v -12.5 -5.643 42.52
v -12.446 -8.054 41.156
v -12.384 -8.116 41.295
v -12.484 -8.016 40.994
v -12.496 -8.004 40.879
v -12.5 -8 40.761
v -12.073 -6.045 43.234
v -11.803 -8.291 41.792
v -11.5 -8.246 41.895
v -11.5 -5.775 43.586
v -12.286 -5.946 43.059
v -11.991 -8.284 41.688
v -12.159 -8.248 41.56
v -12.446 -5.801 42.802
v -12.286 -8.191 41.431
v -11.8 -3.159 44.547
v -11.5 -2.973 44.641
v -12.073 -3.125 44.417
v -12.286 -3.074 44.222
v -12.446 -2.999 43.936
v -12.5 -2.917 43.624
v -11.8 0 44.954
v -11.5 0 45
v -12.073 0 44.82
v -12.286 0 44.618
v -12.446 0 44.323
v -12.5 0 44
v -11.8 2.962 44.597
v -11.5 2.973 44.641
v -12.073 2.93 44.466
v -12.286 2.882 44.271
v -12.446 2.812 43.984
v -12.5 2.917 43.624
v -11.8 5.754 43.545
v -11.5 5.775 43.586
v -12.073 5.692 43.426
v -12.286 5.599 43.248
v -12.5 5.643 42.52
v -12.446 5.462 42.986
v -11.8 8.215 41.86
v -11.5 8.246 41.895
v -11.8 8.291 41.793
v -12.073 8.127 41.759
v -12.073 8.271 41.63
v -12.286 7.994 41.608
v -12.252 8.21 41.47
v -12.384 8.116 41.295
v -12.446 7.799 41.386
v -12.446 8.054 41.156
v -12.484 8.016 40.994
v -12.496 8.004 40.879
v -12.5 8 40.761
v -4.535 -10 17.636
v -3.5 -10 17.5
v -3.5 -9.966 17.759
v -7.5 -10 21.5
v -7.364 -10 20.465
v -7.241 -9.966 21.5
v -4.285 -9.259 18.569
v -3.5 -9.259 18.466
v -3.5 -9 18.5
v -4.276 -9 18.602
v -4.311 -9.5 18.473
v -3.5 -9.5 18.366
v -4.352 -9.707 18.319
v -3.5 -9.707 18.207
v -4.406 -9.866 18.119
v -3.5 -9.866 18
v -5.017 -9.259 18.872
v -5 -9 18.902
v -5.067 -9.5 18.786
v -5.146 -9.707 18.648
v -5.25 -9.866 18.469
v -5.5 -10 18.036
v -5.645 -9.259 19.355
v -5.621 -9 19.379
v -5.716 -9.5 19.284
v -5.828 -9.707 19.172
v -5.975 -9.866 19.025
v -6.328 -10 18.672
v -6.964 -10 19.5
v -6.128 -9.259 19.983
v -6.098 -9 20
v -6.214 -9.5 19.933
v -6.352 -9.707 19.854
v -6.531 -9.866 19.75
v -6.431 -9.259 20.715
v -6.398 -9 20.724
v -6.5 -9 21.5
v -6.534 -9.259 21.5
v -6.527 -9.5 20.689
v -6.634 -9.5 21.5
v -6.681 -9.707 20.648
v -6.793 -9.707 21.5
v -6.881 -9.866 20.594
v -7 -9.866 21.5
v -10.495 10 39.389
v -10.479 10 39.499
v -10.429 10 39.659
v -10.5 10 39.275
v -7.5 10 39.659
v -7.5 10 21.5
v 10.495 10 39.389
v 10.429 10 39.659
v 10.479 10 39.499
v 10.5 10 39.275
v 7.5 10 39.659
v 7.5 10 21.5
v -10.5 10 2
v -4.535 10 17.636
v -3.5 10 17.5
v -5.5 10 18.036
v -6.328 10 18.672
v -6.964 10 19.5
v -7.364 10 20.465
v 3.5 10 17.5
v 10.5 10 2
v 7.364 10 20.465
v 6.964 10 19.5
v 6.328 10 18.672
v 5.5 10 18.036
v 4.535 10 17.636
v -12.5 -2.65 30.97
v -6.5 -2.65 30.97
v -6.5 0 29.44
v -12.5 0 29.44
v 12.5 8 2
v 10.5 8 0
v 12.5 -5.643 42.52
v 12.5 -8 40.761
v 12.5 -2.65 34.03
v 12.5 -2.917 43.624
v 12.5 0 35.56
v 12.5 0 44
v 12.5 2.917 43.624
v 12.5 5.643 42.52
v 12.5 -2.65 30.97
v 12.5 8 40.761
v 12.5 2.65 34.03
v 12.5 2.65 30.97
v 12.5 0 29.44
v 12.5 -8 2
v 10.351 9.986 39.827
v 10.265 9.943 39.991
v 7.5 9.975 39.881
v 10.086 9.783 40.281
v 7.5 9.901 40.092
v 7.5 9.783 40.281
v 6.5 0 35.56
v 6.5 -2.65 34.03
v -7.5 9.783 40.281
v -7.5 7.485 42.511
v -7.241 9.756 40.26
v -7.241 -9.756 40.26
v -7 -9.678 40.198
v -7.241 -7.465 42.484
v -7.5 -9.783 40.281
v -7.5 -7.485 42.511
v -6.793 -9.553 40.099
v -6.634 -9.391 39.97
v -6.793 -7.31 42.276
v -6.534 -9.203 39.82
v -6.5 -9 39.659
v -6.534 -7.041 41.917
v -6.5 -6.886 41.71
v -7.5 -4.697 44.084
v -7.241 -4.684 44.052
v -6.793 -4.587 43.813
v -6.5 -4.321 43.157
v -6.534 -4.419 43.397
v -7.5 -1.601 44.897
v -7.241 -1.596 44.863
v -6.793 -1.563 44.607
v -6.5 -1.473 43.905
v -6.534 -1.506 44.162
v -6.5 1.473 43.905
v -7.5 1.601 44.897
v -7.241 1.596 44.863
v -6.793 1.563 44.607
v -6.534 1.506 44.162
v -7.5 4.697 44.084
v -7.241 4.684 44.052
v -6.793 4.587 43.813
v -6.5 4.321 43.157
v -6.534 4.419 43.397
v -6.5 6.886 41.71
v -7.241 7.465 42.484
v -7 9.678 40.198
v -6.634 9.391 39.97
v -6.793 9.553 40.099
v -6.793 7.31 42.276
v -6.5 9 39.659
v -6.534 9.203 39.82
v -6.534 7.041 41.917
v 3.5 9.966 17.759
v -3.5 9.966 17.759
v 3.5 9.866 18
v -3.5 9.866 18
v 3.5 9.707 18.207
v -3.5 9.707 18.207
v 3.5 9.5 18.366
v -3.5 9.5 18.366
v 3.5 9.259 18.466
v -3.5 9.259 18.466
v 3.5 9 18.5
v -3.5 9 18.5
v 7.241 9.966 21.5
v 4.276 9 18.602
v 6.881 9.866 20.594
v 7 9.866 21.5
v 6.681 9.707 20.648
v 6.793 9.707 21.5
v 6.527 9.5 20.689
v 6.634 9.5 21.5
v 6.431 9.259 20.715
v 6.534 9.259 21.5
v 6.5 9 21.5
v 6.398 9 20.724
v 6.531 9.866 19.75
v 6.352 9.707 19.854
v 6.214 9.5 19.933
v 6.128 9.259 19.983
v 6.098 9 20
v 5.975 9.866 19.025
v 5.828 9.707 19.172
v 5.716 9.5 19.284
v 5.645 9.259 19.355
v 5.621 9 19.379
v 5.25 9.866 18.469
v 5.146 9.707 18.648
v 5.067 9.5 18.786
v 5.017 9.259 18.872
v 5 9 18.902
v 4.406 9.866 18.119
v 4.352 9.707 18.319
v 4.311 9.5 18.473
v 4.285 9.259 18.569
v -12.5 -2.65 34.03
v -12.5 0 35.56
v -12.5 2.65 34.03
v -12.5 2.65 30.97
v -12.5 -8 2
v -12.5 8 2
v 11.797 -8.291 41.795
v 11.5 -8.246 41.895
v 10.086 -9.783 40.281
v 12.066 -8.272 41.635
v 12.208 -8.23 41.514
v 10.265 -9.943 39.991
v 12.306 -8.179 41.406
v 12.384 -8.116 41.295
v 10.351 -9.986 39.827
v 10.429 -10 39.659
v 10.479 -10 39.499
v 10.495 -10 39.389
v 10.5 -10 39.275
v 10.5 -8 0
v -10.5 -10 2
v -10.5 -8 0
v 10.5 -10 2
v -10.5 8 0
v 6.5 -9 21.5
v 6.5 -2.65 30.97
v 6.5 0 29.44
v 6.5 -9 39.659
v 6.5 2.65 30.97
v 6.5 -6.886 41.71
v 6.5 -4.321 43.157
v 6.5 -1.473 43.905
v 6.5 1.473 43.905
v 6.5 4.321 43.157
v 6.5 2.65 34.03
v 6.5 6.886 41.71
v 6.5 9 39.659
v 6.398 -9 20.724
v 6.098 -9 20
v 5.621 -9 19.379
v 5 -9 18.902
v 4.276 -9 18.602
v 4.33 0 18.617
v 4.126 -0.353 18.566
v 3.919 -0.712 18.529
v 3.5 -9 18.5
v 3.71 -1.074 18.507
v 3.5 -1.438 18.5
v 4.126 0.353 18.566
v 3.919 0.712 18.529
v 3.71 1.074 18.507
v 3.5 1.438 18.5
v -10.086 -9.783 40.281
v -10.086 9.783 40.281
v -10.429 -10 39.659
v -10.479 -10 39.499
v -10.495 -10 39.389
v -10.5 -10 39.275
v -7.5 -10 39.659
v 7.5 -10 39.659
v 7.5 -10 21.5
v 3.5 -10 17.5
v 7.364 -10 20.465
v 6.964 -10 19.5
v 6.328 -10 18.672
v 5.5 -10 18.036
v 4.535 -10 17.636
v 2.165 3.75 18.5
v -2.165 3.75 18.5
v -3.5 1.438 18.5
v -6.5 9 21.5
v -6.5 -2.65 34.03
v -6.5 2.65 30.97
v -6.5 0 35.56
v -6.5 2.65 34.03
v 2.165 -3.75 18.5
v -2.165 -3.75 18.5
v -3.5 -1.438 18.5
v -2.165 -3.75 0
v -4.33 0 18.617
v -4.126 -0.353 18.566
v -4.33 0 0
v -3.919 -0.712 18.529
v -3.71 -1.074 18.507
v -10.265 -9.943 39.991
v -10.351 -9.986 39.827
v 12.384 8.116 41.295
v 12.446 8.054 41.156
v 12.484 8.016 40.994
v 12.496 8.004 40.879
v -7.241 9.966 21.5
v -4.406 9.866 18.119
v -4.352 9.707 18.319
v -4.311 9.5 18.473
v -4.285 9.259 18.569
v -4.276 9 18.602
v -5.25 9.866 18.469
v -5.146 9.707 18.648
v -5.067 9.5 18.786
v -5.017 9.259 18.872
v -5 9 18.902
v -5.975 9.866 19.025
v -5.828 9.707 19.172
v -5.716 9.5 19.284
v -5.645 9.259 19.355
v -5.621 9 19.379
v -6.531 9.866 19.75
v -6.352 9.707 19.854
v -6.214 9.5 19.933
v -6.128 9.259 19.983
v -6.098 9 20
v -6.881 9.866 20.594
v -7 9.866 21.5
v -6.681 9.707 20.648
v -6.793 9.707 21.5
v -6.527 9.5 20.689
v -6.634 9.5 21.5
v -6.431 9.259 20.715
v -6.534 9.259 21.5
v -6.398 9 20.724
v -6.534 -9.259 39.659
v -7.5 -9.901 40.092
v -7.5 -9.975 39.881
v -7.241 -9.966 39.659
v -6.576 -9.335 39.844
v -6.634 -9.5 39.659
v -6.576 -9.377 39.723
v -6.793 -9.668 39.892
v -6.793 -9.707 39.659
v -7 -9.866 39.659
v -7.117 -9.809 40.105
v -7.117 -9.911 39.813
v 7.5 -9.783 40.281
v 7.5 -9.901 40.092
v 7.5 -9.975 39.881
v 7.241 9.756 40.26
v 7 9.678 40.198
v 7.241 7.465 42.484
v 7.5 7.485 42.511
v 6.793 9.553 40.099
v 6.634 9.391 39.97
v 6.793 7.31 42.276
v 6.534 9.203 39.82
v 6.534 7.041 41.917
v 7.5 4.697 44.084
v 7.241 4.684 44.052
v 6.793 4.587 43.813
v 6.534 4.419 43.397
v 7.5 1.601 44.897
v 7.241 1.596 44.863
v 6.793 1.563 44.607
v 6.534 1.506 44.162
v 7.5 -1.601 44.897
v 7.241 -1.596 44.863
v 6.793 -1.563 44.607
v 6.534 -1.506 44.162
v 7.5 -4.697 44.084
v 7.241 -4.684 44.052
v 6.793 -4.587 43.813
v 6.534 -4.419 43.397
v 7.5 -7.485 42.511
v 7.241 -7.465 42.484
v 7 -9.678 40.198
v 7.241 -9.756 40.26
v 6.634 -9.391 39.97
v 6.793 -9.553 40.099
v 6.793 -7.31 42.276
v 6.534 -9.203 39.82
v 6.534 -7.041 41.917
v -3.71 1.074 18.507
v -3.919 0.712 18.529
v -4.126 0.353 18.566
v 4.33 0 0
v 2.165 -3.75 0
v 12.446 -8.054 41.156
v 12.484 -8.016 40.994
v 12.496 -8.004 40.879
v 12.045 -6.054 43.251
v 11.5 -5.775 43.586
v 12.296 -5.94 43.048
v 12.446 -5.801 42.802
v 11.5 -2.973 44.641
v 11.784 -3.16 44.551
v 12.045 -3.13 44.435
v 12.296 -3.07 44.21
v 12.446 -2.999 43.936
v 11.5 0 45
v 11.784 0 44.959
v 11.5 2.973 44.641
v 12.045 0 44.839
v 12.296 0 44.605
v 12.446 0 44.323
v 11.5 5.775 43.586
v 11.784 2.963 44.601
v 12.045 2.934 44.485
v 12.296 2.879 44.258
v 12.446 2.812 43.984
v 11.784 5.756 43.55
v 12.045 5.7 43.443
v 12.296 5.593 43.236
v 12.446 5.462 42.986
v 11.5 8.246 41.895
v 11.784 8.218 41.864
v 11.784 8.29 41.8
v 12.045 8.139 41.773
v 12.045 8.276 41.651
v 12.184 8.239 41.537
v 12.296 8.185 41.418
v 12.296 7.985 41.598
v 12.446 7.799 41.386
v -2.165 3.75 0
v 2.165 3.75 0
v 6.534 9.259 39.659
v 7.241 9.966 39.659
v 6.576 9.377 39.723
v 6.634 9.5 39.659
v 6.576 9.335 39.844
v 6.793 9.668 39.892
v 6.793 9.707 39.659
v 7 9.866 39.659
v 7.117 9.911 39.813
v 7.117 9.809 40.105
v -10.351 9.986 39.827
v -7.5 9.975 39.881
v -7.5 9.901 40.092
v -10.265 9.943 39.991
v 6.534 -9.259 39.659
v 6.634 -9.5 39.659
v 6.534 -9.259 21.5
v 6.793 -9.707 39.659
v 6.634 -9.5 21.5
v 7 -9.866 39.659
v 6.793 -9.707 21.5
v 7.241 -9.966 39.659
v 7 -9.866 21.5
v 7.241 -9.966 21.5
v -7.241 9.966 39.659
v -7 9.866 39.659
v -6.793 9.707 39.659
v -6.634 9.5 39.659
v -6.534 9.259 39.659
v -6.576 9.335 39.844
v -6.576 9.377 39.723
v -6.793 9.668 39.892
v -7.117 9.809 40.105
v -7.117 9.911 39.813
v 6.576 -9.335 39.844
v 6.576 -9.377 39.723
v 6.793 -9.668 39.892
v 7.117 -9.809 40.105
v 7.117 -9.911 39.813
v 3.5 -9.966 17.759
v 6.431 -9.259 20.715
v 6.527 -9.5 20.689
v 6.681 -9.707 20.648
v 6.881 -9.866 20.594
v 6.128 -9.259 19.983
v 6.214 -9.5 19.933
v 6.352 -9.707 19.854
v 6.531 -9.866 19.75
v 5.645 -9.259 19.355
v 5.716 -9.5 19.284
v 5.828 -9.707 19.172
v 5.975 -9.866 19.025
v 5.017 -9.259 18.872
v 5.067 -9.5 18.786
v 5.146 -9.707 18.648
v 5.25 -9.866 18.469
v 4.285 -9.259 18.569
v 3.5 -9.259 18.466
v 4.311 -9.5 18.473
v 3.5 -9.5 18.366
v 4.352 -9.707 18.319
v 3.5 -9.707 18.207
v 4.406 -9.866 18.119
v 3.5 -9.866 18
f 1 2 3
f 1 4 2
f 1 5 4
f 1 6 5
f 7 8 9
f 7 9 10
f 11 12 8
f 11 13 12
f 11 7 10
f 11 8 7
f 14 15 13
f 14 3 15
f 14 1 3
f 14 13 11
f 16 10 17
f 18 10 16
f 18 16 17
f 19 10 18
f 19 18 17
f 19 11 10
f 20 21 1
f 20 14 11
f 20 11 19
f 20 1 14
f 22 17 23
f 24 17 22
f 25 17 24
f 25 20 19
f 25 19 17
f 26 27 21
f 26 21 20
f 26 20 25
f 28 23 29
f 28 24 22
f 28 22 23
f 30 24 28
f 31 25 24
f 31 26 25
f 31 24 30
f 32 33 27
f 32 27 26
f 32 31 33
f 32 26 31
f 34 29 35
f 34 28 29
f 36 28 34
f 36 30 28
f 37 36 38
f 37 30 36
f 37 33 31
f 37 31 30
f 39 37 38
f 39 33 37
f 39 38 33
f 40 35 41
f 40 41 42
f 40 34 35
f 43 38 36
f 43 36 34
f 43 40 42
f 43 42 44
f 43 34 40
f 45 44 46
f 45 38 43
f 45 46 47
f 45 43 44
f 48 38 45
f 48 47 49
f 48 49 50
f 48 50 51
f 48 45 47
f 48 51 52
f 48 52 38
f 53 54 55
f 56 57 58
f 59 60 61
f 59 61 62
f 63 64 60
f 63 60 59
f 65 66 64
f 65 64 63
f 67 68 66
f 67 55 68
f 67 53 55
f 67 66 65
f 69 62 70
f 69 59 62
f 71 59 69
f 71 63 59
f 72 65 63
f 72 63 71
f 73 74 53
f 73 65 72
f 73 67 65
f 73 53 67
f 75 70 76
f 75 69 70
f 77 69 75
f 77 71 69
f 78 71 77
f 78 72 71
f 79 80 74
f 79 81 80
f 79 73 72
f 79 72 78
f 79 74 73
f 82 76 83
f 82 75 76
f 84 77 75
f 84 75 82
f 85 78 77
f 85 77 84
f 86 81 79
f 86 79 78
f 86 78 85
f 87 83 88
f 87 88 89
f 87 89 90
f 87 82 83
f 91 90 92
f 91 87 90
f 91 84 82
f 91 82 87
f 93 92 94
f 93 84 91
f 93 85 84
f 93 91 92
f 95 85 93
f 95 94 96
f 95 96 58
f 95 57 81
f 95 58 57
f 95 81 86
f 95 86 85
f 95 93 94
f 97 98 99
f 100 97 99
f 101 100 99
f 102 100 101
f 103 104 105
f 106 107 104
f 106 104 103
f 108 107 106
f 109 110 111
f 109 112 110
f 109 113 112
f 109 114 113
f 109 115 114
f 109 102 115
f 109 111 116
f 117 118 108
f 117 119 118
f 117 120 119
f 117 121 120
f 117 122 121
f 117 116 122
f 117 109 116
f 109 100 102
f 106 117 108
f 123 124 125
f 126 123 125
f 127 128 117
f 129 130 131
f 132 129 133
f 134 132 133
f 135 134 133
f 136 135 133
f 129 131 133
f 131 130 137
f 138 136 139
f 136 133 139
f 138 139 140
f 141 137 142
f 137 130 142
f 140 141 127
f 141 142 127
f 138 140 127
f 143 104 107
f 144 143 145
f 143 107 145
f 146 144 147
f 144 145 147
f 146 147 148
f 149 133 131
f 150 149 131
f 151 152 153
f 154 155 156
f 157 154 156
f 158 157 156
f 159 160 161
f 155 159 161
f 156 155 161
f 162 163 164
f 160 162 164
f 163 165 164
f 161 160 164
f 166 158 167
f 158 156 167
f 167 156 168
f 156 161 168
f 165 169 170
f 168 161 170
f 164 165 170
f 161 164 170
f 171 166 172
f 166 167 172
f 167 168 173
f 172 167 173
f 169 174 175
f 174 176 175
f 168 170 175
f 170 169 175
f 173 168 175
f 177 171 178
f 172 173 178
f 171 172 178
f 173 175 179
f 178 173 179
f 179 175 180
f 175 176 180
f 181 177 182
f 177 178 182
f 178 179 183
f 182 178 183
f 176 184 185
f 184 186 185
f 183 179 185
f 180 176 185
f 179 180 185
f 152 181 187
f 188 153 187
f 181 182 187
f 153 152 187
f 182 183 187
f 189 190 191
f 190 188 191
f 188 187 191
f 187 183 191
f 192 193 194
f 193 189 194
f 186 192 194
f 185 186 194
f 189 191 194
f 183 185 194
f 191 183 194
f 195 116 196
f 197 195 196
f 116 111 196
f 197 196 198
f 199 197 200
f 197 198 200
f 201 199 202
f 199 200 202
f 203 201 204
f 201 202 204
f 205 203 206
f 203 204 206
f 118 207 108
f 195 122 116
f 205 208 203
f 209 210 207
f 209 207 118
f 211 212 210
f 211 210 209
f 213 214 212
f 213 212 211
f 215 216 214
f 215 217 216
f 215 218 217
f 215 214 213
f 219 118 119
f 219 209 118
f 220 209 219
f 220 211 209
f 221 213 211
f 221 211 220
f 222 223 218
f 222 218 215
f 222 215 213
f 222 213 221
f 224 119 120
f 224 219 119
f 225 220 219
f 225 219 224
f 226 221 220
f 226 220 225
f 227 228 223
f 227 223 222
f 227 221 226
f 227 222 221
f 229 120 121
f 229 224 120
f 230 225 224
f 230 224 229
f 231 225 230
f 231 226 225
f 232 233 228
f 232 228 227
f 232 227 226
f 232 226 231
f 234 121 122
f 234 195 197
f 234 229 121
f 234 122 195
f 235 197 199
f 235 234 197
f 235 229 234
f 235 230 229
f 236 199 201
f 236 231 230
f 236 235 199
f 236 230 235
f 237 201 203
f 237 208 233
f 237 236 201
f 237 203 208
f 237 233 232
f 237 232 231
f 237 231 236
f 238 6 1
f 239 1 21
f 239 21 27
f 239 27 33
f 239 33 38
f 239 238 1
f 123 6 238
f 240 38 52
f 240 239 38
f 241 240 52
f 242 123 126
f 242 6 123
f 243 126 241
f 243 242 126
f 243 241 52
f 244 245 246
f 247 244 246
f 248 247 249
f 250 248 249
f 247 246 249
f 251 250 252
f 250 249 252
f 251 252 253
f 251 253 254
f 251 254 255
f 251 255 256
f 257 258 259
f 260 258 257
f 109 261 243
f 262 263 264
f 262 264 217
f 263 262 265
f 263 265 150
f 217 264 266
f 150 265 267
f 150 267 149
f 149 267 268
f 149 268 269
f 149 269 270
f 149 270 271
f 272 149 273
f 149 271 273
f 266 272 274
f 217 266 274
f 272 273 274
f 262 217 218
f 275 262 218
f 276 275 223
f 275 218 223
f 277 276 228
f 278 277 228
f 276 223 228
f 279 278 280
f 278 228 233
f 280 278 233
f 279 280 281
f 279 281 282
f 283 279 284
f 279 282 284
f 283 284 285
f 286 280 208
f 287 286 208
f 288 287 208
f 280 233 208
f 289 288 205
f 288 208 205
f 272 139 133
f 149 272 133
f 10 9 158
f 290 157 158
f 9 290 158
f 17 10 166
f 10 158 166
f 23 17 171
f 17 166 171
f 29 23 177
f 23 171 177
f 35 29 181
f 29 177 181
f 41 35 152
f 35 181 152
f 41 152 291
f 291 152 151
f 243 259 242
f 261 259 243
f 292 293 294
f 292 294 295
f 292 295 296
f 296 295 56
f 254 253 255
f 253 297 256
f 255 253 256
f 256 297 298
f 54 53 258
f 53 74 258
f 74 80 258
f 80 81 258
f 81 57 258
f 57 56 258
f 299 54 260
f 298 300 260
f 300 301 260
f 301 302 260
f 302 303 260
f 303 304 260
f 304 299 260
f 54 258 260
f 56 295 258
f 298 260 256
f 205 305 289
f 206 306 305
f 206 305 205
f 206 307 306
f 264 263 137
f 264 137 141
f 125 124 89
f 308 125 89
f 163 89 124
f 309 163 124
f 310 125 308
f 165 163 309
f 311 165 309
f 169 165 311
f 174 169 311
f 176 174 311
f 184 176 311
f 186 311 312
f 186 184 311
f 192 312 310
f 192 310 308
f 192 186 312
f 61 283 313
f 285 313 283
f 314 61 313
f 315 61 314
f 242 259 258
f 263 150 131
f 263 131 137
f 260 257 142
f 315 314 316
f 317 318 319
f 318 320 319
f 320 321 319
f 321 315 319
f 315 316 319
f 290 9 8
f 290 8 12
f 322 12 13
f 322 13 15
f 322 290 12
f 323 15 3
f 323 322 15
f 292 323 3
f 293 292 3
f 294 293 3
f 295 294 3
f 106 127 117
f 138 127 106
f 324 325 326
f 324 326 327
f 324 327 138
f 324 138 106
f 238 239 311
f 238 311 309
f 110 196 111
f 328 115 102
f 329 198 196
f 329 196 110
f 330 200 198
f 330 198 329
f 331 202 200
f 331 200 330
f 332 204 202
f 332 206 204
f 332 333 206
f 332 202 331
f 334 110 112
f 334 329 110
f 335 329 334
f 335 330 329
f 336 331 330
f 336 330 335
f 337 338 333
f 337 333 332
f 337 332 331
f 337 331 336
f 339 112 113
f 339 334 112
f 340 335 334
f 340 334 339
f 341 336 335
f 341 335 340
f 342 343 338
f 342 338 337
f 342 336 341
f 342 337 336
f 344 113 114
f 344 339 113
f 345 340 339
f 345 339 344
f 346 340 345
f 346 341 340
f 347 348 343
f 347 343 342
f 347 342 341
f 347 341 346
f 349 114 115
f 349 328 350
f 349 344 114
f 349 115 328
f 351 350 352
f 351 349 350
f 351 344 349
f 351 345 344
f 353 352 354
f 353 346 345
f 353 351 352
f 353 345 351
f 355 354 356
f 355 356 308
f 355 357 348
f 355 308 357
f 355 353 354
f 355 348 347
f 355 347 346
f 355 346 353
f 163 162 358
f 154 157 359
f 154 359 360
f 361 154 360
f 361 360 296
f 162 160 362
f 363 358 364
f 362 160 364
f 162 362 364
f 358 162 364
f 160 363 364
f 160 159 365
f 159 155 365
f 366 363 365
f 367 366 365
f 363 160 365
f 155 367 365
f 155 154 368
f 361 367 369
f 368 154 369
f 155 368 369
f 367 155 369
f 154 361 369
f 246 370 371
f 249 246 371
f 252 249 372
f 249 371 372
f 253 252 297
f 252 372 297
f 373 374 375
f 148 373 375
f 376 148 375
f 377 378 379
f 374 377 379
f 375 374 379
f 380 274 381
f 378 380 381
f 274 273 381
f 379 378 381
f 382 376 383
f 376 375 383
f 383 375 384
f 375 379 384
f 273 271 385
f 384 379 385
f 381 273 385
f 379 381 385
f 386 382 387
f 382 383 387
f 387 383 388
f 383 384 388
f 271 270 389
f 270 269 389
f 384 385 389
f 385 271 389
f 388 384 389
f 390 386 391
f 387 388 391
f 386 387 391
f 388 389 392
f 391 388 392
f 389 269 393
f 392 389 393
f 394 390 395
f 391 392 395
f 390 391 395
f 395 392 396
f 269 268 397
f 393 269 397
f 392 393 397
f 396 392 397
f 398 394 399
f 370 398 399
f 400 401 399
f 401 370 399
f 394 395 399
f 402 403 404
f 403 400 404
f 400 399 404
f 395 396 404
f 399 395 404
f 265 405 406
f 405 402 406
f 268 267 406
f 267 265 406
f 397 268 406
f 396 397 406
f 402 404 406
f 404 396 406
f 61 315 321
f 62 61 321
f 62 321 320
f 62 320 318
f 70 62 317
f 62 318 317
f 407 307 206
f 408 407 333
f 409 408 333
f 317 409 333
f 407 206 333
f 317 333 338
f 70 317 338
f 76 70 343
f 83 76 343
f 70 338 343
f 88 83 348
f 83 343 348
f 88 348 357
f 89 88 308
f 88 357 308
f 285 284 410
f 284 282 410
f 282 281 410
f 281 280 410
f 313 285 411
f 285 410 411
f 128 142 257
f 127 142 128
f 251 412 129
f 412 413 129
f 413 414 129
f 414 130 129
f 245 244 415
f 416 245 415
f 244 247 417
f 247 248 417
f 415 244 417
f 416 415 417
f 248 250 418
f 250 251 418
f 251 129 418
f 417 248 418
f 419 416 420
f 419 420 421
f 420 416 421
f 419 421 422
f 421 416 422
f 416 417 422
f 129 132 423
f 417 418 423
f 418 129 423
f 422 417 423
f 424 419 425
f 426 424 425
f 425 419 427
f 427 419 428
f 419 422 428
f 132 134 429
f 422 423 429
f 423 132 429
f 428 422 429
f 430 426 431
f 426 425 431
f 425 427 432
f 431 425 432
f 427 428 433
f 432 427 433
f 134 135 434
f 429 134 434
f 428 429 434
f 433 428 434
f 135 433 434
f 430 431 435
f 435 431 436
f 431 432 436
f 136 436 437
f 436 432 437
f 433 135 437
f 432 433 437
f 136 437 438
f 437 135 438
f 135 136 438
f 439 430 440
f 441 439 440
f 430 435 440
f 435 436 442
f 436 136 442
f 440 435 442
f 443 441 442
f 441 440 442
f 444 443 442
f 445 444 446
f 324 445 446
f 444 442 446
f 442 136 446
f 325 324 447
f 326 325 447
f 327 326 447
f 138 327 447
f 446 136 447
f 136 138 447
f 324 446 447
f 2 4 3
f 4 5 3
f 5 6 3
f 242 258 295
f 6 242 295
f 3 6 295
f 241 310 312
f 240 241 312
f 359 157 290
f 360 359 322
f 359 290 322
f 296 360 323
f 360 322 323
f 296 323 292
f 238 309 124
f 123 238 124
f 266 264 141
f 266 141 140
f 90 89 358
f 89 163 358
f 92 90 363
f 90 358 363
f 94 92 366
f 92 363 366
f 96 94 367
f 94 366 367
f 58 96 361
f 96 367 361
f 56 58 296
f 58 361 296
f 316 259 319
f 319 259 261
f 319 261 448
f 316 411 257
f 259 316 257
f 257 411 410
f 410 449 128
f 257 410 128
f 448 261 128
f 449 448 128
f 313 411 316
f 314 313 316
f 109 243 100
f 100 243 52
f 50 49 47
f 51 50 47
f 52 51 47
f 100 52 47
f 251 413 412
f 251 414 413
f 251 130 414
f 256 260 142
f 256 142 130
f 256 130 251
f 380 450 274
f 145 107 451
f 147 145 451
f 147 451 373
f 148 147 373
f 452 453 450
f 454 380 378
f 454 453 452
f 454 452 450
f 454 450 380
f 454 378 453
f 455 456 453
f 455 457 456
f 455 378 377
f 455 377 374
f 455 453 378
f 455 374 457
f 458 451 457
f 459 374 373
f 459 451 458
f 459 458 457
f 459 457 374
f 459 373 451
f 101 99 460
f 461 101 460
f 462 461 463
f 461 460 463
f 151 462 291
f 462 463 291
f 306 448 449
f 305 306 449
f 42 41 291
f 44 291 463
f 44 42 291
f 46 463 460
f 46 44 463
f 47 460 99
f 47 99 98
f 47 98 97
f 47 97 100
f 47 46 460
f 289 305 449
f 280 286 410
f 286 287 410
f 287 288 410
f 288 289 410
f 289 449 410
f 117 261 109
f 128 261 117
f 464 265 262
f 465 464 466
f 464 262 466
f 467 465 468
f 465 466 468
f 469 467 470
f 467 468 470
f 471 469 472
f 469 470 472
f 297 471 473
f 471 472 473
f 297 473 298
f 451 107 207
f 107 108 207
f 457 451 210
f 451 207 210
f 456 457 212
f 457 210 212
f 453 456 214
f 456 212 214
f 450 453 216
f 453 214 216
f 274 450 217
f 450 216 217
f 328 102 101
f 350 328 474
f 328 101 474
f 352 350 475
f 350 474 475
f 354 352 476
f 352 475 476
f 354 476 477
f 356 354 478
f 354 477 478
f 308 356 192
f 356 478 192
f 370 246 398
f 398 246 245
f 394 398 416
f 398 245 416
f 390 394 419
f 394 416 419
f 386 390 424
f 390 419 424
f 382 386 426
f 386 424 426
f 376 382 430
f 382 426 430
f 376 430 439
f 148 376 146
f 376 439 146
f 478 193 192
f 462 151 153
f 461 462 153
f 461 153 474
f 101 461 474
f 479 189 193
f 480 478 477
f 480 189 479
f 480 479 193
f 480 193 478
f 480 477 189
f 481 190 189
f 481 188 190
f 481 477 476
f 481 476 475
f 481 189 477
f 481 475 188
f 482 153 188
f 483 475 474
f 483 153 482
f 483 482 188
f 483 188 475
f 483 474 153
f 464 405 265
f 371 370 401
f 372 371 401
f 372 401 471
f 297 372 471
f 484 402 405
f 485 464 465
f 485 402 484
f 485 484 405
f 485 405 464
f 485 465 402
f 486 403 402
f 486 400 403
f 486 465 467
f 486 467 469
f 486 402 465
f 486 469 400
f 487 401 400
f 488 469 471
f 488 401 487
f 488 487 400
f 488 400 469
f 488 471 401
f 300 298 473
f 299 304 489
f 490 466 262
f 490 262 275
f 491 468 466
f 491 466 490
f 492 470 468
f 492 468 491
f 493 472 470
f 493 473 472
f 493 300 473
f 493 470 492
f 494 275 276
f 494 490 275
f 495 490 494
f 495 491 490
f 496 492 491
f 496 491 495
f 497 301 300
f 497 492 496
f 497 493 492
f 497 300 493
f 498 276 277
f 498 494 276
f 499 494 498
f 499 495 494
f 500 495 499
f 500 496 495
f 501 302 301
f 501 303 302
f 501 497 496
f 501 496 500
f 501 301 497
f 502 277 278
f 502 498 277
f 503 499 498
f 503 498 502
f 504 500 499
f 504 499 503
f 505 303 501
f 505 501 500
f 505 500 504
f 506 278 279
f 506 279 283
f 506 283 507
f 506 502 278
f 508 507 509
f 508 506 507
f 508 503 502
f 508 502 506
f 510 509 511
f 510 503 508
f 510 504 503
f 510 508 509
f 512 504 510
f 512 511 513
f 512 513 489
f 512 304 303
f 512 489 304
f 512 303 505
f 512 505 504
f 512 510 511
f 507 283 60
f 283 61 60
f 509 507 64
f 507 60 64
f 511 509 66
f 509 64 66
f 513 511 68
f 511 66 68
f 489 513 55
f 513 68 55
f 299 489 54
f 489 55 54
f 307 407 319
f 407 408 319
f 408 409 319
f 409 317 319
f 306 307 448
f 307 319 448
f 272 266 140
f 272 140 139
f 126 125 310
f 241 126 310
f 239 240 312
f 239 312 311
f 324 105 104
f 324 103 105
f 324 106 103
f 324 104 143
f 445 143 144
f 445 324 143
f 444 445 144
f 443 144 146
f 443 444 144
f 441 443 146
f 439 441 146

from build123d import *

# Parameters (mm, degrees)
F0_W           = 25
F0_H           = 20
F1_DEPTH       = 45
F6_DEPTH       = 12.501
F6_DEPTH_BACK  = 12.501
F4_W           = 30
F4_H           = 26.5
F7_DEPTH       = 6.5
F7_DEPTH_BACK  = 6.5
F8_R           = 3
F9_SIZE        = 2
F10_R          = 1
F11_DEPTH      = 12.5010001
F11_DEPTH_BACK = 12.5010001
F12_DEPTH      = 25


with BuildPart() as f1:
    # F0 (on Top) → F1 (new body)
    with BuildSketch(Plane.XY):
        Rectangle(F0_W, F0_H)
    extrude(amount=F1_DEPTH)

    # F3 (on Right) → F6 (cut, two sides)
    with BuildSketch(Plane.YZ) as f6_sk:
        with BuildLine():
            Line((12.4710435048, 32.5), (12.5, 32.5))
            ThreePointArc((12.5, 32.5), (12.4927587788, 32.9254152033), (12.4710435048, 33.3503375224))
            Line((12.4710435048, 33.3503375224), (12.4710435048, 32.5))
        make_face()
        with BuildLine():
            ThreePointArc((-12.5, 32.5), (-0.4254152033, 44.9927587788), (12.4710435048, 33.3503375224))
            Line((12.4710435048, 33.3503375224), (12.4710435048, 47.7809855342))
            Line((12.4710435048, 47.7809855342), (-12.574961409, 47.7809855342))
            Line((-12.574961409, 47.7809855342), (-12.574961409, 32.5))
            Line((-12.574961409, 32.5), (-12.5, 32.5))
        make_face()
    extrude(amount=-F6_DEPTH, mode=Mode.SUBTRACT)
    extrude(f6_sk.sketch, amount=F6_DEPTH_BACK, mode=Mode.SUBTRACT)

    # F4 (on Right) → F7 (cut, two sides)
    with BuildSketch(Plane.YZ) as f7_sk:
        with Locations((0.1584350094, 31.75)):
            Rectangle(F4_W, F4_H)
    extrude(amount=F7_DEPTH, mode=Mode.SUBTRACT)
    extrude(f7_sk.sketch, amount=-F7_DEPTH_BACK, mode=Mode.SUBTRACT)

    # F8
    f8_edges = [f1.edges().sort_by_distance(p)[0] for p in [
        (6.5, 0, 18.5),
        (-6.5, 0, 18.5),
    ]]
    fillet(f8_edges, radius=F8_R)

    # F9
    f9_edges = [f1.edges().sort_by_distance(p)[0] for p in [
        (12.5, 0, 0),
        (0, 10, 0),
        (-12.5, 0, 0),
        (0, -10, 0),
        (-12.5, 10, 20),
        (12.5, 10, 20),
        (-12.5, -10, 20),
        (12.5, -10, 20),
    ]]
    chamfer(f9_edges, length=F9_SIZE)

    # F10
    f10_edges = [f1.edges().sort_by_distance(p)[0] for p in [
        (6.5, 10, 30.75),
        (6.5, 0, 21.5),
        (6.5, 0, 45),
        (6.5, -10, 30.75),
        (-12.5, 0, 45),
        (-11.458371, 9.041629, 41.131278),
        (-11.458371, -9.041629, 41.131278),
        (-8.5, 10, 40),
        (-8.5, -10, 40),
        (-6.5, 0, 45),
        (8.5, 10, 40),
        (11.458371, 9.041629, 41.131278),
        (12.5, 0, 45),
        (8.5, -10, 40),
        (11.458371, -9.041629, 41.131278),
    ]]
    fillet(f10_edges, radius=F10_R)

    # F5 (on Right) → F11 (cut, two sides)
    with BuildSketch(Plane.YZ) as f11_sk:
        Polygon((-2.65, 30.9700217866), (0, 29.4400435733), (2.65, 30.9700217866), (2.65, 34.0299782134), (0, 35.5599564267), (-2.65, 34.0299782134), align=None)
    extrude(amount=-F11_DEPTH, mode=Mode.SUBTRACT)
    extrude(f11_sk.sketch, amount=F11_DEPTH_BACK, mode=Mode.SUBTRACT)

    # F2 (on face) → F12 (cut)
    with BuildSketch(Plane(origin=(0, 0, 0), x_dir=(1, 0, 0), z_dir=(0, 0, -1))):
        Polygon((4.3301270189, 0), (2.1650635095, 3.75), (-2.1650635095, 3.75), (-4.3301270189, 0), (-2.1650635095, -3.75), (2.1650635095, -3.75), align=None)
    extrude(amount=-F12_DEPTH, mode=Mode.SUBTRACT)


solid = f1.part
